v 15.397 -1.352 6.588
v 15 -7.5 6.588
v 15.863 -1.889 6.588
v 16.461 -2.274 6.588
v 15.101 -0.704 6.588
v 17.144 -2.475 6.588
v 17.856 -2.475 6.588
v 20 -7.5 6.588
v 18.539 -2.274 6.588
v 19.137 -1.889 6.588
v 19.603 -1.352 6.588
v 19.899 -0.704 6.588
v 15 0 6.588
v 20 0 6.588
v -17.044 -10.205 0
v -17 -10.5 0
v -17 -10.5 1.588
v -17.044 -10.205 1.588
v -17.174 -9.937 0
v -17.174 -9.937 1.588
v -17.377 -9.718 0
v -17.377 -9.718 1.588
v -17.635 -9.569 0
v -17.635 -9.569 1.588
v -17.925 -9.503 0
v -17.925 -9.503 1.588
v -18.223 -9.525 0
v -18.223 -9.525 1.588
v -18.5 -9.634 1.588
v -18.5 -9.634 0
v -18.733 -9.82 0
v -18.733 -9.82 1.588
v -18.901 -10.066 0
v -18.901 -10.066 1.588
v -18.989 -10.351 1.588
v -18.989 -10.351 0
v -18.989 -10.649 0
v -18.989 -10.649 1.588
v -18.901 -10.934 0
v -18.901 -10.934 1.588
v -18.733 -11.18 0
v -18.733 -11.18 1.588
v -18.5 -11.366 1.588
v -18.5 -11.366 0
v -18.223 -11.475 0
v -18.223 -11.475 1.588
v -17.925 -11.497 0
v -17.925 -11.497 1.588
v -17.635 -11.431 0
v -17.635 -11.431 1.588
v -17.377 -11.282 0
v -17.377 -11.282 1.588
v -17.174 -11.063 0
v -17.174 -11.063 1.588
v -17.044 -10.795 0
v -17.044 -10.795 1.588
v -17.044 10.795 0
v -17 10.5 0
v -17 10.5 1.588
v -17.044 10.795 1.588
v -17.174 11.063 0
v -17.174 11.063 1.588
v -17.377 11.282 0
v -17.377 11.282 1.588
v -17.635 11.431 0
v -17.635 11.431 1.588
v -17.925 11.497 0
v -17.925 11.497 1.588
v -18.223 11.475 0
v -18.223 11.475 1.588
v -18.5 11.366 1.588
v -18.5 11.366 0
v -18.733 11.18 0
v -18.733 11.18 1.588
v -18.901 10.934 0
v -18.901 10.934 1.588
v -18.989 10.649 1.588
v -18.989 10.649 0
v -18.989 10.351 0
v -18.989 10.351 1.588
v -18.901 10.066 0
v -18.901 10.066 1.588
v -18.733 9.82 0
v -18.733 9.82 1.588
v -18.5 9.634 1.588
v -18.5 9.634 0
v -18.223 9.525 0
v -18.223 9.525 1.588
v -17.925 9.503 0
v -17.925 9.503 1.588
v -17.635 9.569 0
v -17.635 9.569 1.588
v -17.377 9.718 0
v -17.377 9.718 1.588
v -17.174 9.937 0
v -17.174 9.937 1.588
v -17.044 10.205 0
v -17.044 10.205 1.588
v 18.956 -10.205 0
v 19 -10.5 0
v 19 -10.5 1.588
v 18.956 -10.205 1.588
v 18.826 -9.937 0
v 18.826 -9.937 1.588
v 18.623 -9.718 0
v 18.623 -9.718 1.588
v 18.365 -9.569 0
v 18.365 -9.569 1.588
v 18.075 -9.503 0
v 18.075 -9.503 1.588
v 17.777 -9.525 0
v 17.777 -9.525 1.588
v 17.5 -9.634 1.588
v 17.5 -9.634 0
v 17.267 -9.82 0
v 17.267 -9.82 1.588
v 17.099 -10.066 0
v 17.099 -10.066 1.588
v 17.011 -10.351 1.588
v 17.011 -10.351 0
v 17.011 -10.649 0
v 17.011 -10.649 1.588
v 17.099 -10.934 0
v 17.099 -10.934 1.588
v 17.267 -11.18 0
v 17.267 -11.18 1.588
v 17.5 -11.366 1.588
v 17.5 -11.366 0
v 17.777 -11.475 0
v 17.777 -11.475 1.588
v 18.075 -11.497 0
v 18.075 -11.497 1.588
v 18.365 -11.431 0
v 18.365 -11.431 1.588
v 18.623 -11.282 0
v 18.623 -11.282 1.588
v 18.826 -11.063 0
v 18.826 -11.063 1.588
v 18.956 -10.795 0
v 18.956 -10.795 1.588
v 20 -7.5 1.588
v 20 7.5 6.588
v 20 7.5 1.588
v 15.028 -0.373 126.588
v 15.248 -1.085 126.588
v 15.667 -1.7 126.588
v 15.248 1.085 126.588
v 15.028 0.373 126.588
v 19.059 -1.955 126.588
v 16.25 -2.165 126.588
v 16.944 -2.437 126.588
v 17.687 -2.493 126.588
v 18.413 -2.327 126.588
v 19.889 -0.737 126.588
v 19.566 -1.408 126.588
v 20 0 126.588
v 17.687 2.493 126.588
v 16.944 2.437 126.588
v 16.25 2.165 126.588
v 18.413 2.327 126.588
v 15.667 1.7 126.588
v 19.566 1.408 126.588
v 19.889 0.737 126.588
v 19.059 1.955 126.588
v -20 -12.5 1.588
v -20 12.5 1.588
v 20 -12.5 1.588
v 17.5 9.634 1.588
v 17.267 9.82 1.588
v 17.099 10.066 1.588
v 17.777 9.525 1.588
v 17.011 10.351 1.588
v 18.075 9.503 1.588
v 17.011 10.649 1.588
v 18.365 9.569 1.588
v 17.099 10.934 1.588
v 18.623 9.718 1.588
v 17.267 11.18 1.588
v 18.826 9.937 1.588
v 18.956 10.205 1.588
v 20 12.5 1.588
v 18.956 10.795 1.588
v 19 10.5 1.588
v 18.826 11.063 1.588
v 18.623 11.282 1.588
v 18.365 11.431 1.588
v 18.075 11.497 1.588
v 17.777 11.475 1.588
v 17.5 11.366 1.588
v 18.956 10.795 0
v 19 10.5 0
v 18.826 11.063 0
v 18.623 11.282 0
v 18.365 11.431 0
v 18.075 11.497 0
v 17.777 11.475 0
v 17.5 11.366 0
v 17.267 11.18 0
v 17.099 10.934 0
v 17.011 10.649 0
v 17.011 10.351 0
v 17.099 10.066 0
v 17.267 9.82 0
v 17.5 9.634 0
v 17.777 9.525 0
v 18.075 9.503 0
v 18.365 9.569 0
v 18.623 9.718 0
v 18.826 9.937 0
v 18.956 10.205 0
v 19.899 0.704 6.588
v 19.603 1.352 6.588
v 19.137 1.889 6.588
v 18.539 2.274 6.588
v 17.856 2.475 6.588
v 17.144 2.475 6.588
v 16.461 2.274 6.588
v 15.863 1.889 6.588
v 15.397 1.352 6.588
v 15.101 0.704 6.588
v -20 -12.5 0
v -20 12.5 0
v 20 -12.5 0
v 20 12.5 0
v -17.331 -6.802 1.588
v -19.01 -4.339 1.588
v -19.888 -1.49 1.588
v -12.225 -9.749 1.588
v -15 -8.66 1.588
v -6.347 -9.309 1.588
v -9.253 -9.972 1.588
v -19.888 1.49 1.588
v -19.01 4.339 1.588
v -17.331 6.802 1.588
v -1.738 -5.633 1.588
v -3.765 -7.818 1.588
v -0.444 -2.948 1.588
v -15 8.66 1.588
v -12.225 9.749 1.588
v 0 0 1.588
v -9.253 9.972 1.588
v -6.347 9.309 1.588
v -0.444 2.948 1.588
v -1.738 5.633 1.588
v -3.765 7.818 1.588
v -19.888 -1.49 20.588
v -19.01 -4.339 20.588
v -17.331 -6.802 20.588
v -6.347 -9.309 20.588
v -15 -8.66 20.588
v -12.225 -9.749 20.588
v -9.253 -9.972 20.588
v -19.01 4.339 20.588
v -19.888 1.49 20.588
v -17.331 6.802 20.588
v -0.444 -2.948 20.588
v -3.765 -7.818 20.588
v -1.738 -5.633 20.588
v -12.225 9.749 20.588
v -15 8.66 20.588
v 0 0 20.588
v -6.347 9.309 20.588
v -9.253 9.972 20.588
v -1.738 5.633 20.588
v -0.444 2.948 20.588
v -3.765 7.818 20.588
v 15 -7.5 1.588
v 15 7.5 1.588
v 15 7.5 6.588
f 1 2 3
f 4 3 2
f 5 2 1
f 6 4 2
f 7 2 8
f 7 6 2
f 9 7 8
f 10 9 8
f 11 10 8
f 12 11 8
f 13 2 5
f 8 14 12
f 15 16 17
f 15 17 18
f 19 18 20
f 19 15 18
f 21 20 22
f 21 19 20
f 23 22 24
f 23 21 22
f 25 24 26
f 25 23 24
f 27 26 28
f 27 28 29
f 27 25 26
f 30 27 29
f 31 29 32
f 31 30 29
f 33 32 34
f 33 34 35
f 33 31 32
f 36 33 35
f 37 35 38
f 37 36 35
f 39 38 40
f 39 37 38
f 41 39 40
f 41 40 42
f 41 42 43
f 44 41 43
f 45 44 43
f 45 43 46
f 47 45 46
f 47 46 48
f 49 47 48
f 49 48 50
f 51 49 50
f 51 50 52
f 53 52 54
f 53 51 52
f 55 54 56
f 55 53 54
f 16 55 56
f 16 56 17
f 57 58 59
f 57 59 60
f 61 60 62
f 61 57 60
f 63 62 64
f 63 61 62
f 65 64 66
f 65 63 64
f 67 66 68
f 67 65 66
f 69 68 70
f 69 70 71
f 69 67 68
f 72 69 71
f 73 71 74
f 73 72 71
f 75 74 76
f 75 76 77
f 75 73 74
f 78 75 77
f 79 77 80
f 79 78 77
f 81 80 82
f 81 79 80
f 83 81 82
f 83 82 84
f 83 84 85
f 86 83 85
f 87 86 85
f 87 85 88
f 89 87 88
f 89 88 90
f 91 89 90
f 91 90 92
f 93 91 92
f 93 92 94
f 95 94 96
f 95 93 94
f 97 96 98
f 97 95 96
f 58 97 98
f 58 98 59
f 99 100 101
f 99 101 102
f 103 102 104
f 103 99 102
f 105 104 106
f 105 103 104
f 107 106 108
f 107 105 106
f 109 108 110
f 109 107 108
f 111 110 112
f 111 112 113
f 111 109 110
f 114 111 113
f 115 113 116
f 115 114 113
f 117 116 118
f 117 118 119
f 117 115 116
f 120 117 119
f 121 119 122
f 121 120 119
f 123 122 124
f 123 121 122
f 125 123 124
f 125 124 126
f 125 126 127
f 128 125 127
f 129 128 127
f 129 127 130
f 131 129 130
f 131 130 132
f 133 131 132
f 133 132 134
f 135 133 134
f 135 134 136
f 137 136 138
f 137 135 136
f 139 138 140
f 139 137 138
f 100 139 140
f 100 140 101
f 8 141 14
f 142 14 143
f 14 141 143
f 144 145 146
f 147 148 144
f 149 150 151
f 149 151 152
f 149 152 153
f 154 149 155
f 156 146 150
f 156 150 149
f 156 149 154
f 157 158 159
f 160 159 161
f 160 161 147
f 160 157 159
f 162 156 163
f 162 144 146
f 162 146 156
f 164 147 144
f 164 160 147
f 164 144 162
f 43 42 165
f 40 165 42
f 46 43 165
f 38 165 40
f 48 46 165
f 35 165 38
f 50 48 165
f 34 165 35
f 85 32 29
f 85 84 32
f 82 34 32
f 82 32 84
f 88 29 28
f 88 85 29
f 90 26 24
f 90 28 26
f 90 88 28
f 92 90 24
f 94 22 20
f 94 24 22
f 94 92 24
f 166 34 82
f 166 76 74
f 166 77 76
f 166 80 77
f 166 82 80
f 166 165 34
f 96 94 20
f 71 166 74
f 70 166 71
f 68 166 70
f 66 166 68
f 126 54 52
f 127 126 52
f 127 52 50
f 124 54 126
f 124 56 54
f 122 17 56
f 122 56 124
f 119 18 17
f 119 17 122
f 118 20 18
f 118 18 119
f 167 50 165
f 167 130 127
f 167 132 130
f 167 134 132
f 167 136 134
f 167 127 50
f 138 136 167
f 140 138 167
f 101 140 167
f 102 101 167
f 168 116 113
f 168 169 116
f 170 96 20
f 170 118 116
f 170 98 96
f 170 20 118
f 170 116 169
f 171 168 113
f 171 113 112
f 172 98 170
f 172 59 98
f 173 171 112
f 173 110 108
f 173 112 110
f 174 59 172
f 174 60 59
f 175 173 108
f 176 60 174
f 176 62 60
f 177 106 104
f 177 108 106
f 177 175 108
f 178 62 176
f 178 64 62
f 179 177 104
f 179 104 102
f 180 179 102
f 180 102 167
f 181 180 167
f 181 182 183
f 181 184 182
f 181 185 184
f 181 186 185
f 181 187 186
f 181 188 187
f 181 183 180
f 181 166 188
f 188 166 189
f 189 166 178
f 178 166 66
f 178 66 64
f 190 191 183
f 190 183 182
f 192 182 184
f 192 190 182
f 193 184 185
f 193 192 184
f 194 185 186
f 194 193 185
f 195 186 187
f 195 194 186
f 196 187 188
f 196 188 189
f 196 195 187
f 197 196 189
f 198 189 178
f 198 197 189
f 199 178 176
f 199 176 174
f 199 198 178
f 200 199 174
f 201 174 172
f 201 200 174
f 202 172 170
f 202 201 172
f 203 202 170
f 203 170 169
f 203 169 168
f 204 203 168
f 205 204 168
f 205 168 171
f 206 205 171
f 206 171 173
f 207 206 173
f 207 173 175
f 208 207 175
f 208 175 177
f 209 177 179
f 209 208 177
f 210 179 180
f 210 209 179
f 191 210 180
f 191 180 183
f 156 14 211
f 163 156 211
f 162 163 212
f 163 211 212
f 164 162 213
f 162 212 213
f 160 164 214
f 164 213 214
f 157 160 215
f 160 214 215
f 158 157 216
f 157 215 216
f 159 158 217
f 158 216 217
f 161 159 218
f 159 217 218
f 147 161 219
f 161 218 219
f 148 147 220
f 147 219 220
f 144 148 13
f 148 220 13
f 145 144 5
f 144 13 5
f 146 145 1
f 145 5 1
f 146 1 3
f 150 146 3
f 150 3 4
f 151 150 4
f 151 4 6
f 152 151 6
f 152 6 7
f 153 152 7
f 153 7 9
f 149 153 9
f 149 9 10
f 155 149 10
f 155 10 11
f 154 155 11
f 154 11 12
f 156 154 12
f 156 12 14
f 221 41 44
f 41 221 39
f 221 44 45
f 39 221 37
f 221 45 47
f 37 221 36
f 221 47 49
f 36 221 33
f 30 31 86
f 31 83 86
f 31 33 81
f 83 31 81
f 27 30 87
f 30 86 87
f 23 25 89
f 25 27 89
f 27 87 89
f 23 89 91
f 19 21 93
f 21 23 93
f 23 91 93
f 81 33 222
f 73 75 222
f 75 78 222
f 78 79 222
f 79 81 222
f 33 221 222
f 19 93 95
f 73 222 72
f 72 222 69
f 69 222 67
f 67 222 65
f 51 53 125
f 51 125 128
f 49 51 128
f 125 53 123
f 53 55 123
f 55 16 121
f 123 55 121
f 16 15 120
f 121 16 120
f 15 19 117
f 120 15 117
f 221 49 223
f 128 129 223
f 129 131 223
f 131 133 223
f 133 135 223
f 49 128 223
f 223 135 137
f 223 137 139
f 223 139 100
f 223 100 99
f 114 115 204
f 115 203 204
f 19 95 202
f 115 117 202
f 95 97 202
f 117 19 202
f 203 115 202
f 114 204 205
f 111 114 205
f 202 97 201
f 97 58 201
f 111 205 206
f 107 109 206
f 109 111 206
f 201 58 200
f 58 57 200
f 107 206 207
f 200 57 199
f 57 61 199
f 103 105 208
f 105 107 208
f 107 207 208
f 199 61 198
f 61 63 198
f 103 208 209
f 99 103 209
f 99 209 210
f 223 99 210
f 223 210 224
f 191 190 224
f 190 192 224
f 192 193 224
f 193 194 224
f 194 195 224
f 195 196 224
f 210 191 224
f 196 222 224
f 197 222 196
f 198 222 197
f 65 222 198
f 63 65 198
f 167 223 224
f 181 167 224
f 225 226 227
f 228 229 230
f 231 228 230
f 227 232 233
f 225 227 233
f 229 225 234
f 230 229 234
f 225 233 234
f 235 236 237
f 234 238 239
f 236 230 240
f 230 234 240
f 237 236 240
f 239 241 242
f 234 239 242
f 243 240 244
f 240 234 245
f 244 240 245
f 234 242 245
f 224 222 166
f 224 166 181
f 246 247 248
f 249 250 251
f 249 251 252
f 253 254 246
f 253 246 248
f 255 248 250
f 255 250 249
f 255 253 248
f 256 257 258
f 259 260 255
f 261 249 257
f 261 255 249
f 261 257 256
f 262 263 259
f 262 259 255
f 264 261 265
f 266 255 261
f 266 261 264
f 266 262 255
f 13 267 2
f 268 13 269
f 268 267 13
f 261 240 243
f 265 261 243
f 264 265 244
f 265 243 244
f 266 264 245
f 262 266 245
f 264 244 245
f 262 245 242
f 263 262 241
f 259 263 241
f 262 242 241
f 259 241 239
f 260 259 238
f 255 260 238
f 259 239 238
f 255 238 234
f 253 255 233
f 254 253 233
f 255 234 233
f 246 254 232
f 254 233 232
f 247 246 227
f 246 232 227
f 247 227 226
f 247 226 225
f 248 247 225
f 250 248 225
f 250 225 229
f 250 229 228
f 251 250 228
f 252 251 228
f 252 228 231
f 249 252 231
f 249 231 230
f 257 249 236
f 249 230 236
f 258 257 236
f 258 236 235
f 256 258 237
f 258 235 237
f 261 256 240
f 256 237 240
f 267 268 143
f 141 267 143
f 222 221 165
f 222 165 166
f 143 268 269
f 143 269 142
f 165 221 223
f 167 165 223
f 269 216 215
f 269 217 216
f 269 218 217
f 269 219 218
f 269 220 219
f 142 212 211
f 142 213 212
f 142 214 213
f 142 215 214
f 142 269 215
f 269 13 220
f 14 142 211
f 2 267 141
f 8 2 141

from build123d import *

# Parameters (mm, degrees)
F0_W     = 40
F0_H     = 25
F0_R     = 1
F1_DEPTH = 1.5875
F2_R     = 10
F3_DEPTH = 19
F4_W     = 5
F4_H     = 15
F5_DEPTH = 5
F6_R     = 2.5
F7_DEPTH = 120


# Not quite as in the source:
# - a length typed as a fraction of an inch, garbled in the dataset ("3 / 203.2 mm" for 3/8 in), is restored


with BuildPart() as f1:
    # F0 (on Top) → F1 (new body)
    with BuildSketch(Plane.XY):
        Rectangle(F0_W, F0_H)
        with Locations((-18, -10.5)):
            Circle(F0_R, mode=Mode.SUBTRACT)
        with Locations((18, -10.5)):
            Circle(F0_R, mode=Mode.SUBTRACT)
        with Locations((-18, 10.5)):
            Circle(F0_R, mode=Mode.SUBTRACT)
        with Locations((18, 10.5)):
            Circle(F0_R, mode=Mode.SUBTRACT)
    extrude(amount=F1_DEPTH)


with BuildPart() as f3:
    # F2 (on face) → F3 (new body)
    with BuildSketch(Plane.XY.offset(1.5875)):
        with Locations((-10, 0)):
            Circle(F2_R)
    extrude(amount=F3_DEPTH)


with BuildPart() as f5:
    # F4 (on face) → F5 (new body)
    with BuildSketch(Plane.XY.offset(1.5875)):
        with Locations((17.5, 0)):
            Rectangle(F4_W, F4_H)
    extrude(amount=F5_DEPTH)

    # F6 (on face) → F7 (join)
    with BuildSketch(Plane.XY.offset(6.5875)):
        with Locations((17.5, 0)):
            Circle(F6_R)
    extrude(amount=F7_DEPTH)


solid = Compound([f1.part, f3.part, f5.part])
